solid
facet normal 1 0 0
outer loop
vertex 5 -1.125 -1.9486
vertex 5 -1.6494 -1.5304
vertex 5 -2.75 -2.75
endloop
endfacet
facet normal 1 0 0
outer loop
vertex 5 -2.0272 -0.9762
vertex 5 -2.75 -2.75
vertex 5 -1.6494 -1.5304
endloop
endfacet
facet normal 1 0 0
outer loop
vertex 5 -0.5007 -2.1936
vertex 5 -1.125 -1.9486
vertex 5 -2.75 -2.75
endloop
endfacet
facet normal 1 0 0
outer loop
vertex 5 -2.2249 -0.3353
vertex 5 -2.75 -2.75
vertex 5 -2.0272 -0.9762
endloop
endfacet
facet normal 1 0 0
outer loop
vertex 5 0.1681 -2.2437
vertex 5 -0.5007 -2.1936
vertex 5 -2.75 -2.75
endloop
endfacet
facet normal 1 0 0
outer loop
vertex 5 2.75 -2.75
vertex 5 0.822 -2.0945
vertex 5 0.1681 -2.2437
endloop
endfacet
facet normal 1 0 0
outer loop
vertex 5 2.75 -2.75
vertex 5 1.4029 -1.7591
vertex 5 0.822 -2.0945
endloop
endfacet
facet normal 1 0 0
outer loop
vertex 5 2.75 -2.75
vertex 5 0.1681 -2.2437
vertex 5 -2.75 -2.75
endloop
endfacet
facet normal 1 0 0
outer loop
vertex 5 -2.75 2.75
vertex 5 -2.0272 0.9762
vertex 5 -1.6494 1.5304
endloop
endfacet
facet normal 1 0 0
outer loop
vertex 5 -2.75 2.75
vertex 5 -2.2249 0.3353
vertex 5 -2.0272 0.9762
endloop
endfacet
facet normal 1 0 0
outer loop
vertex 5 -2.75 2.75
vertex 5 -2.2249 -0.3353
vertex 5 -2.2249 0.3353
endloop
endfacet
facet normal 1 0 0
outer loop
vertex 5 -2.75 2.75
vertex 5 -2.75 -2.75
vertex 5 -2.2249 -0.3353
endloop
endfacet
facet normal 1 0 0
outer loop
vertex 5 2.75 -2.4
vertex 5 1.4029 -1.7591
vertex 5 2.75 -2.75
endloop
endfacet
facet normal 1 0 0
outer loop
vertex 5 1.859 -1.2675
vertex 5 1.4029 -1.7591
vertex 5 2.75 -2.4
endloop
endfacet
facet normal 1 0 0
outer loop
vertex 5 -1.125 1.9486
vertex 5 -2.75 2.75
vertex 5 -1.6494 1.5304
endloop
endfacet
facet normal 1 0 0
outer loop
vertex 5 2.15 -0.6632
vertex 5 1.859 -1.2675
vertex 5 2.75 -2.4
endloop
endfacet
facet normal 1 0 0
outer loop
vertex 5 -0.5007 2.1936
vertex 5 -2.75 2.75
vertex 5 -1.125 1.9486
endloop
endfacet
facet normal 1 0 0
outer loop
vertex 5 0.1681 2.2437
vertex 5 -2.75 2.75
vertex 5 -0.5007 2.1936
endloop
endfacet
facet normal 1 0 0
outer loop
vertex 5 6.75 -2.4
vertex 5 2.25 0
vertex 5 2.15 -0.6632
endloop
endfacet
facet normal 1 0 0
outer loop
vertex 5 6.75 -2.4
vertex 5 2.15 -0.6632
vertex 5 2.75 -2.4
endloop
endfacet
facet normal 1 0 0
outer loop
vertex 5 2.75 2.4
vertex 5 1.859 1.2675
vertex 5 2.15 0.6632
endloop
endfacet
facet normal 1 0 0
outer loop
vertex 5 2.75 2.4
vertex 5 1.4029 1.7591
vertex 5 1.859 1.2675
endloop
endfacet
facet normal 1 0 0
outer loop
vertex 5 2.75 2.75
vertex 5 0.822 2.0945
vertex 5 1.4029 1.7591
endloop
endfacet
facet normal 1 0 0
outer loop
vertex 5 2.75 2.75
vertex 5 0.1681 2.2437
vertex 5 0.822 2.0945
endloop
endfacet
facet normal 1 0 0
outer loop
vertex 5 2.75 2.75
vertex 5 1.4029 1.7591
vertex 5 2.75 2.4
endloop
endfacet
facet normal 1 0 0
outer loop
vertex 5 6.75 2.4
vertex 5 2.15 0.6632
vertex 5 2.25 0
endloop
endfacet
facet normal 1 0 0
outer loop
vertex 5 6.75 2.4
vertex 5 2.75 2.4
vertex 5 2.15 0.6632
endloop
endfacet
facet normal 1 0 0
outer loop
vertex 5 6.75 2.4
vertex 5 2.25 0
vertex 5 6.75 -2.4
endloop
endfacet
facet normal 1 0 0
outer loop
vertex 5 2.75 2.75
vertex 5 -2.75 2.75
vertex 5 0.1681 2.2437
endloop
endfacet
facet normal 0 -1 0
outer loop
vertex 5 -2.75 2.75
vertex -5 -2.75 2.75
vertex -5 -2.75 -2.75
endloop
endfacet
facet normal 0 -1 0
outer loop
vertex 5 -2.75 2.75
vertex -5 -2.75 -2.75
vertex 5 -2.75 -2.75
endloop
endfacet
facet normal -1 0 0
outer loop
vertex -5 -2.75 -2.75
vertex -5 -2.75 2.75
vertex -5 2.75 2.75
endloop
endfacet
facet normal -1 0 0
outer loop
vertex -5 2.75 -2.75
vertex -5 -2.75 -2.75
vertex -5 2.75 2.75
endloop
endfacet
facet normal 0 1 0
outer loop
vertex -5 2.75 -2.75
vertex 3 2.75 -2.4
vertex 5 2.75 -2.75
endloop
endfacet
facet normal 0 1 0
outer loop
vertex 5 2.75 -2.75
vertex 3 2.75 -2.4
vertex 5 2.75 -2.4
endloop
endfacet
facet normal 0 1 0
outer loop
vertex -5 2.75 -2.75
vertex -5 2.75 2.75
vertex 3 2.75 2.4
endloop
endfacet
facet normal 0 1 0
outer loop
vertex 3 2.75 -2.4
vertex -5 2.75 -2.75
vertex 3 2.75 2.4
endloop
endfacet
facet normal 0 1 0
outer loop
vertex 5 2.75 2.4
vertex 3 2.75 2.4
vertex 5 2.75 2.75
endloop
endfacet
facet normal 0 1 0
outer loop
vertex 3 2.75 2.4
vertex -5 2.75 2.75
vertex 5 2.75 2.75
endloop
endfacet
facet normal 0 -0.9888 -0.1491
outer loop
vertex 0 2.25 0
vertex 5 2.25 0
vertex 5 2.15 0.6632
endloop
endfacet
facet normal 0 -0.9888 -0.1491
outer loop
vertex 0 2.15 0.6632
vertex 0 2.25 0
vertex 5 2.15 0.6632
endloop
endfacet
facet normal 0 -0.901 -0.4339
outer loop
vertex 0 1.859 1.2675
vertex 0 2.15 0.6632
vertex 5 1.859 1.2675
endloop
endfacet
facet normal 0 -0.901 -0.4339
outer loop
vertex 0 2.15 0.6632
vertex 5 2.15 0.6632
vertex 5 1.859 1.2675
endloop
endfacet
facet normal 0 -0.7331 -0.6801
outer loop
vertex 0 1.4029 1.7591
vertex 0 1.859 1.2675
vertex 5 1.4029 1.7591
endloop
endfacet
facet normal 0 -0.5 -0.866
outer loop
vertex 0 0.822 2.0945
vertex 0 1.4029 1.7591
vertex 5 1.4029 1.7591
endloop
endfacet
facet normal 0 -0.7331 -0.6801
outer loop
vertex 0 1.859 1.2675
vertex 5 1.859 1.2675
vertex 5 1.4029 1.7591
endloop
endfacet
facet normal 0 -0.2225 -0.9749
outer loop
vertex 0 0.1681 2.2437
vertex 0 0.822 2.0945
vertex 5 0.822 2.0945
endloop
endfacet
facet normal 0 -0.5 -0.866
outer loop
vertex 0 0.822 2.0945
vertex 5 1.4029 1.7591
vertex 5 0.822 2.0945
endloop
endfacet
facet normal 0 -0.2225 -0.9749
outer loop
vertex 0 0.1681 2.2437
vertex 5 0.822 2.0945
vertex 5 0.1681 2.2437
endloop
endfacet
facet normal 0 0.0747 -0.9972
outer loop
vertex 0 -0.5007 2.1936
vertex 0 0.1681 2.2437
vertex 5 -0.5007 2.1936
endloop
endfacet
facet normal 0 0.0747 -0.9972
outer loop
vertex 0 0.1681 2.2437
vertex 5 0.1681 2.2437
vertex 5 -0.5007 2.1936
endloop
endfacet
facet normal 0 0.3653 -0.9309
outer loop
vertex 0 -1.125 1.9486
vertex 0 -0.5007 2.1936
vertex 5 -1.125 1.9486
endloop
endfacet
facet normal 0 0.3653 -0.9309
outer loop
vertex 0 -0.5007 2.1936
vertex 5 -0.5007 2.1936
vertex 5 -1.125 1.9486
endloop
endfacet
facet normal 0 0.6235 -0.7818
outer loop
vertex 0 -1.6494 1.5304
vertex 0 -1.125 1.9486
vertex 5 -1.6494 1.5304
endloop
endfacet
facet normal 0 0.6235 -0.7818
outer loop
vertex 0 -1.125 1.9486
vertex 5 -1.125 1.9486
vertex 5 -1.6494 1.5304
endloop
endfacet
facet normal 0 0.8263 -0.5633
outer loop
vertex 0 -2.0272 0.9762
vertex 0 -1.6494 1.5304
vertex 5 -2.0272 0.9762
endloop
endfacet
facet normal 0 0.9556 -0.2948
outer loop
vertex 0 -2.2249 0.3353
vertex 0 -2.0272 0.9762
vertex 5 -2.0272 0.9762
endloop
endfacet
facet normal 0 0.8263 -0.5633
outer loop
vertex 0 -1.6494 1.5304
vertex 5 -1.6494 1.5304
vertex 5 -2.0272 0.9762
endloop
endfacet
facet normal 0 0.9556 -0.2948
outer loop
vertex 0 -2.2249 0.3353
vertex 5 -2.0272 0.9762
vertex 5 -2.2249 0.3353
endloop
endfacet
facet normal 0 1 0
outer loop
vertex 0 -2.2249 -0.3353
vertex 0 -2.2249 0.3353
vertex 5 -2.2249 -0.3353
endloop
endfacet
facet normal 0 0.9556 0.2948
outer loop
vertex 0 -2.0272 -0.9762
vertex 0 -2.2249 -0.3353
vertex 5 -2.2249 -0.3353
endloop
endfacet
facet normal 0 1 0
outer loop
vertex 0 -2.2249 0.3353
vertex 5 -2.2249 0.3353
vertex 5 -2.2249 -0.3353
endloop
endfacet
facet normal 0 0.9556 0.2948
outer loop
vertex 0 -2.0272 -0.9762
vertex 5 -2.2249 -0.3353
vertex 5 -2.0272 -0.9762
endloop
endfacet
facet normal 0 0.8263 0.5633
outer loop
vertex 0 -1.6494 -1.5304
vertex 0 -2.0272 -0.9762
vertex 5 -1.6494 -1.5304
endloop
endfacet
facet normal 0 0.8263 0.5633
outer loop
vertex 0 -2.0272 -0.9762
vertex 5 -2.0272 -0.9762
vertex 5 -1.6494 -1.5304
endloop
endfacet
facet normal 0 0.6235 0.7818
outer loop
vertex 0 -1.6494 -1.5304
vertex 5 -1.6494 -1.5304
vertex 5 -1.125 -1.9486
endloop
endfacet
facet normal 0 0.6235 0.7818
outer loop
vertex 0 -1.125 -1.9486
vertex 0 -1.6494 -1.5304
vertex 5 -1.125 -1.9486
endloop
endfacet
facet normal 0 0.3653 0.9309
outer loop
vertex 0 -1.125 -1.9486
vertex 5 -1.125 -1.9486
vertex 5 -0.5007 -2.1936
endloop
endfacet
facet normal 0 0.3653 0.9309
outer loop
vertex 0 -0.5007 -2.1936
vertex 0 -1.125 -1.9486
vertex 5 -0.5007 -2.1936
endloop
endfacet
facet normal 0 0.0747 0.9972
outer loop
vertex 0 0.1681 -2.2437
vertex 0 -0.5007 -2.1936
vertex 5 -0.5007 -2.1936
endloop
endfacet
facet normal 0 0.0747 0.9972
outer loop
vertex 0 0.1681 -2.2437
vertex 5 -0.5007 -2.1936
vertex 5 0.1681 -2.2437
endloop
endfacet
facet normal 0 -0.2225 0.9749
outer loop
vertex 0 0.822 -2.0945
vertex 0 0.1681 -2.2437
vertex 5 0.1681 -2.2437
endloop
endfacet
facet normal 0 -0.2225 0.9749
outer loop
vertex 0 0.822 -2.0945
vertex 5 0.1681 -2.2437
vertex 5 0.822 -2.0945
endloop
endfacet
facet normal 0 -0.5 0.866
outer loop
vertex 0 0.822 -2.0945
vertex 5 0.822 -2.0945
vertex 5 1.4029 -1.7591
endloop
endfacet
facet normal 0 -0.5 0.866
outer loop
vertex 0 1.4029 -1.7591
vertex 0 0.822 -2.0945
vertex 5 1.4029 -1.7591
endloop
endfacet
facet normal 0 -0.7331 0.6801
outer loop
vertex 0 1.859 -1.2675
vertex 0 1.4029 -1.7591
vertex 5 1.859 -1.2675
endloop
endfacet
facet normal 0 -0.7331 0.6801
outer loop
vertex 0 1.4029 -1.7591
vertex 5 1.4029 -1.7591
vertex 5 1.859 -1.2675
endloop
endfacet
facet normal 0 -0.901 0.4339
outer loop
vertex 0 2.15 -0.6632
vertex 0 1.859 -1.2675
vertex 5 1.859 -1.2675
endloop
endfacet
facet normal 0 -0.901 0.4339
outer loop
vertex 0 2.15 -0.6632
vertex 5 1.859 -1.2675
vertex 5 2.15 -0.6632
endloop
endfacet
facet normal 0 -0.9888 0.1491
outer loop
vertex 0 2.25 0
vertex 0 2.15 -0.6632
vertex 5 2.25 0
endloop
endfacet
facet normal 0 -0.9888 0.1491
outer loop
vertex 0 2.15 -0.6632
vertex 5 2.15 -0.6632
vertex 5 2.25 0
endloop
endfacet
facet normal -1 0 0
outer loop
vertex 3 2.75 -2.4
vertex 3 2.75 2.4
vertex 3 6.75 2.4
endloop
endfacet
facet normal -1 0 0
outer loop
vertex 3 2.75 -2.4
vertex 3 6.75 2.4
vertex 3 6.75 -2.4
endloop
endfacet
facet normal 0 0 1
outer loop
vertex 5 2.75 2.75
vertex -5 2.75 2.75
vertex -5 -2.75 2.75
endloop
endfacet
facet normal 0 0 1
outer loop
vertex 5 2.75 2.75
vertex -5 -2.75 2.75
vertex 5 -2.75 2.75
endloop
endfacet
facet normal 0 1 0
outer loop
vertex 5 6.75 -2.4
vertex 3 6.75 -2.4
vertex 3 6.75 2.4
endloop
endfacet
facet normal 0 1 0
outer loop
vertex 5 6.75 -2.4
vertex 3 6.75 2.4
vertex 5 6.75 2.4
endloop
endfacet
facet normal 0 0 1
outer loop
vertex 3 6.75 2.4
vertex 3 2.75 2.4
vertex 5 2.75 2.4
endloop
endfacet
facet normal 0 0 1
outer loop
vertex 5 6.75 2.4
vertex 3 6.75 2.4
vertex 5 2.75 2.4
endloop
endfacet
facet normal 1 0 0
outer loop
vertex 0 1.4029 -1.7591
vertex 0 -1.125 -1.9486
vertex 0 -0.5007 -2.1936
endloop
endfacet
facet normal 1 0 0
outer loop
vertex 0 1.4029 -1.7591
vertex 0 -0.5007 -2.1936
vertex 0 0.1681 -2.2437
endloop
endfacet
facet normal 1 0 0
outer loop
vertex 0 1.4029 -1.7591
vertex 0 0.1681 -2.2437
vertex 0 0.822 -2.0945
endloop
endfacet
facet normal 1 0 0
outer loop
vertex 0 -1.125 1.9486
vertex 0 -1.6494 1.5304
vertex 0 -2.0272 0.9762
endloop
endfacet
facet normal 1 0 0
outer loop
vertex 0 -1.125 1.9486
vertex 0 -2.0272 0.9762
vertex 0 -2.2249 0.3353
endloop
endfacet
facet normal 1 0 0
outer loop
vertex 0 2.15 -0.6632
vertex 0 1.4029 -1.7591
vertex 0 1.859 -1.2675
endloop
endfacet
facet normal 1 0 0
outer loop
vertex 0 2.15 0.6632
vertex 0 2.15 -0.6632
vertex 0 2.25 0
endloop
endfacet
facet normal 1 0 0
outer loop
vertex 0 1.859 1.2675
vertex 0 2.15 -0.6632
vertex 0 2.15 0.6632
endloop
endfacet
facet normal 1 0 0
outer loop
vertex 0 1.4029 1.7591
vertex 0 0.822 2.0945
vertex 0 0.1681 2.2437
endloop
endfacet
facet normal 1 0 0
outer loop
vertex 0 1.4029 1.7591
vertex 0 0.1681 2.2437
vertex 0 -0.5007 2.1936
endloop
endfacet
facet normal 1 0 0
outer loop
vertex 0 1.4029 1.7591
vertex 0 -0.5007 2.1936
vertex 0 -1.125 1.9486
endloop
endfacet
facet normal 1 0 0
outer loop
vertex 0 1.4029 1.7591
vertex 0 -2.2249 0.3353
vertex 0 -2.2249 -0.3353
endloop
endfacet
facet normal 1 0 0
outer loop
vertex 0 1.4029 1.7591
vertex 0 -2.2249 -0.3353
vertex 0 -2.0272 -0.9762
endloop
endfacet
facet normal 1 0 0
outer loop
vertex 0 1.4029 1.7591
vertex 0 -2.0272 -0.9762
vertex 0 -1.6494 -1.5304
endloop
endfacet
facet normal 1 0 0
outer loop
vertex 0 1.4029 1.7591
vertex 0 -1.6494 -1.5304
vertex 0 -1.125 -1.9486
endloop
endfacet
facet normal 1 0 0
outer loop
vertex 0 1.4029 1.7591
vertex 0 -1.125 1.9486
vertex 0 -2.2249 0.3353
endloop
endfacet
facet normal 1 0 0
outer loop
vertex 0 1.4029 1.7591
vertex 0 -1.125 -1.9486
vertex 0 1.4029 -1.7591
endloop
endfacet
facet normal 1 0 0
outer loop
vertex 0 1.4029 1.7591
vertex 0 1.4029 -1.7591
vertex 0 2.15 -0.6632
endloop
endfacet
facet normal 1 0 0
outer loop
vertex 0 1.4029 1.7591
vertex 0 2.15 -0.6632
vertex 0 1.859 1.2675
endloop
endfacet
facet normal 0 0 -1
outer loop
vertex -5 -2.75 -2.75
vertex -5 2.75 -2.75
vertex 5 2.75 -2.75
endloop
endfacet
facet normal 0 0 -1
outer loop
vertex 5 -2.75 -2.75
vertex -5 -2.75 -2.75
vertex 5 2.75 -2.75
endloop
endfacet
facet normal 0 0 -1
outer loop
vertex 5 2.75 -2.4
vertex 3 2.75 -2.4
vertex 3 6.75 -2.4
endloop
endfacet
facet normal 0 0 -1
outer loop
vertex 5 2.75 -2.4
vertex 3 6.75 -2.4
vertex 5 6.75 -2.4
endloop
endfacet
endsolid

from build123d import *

# Parameters (mm, degrees)
SKETCH2_W           = 10
SKETCH2_H           = 5.5
BOSS_EXTRUDE1_DEPTH = 2.75
SKETCH3_R           = 2.25
CUT_EXTRUDE1_DEPTH  = 5
SKETCH4_W           = 2
SKETCH4_H           = 4.8
BOSS_EXTRUDE2_DEPTH = 4


with BuildPart() as part:
    # Sketch2 → Boss-Extrude1 (new, symmetric)
    with BuildSketch(Plane.XY):
        Rectangle(SKETCH2_W, SKETCH2_H)
    extrude(amount=BOSS_EXTRUDE1_DEPTH, both=True)

    # Sketch3 → Cut-Extrude1 (cut)
    with BuildSketch(Plane(origin=(5, 0, 0), x_dir=(0, 0, -1), z_dir=(1, 0, 0))):
        with Locations(Location((0, 0, 0), (0, 0, 90))):
            Circle(SKETCH3_R)
    extrude(amount=-CUT_EXTRUDE1_DEPTH, mode=Mode.SUBTRACT)

    # Sketch4 → Boss-Extrude2 (add)
    with BuildSketch(Plane(origin=(0, 2.75, 0), x_dir=(1, 0, 0), z_dir=(0, 1, 0))):
        with Locations((4, 0)):
            Rectangle(SKETCH4_W, SKETCH4_H)
    extrude(amount=BOSS_EXTRUDE2_DEPTH)


solid = part.part
